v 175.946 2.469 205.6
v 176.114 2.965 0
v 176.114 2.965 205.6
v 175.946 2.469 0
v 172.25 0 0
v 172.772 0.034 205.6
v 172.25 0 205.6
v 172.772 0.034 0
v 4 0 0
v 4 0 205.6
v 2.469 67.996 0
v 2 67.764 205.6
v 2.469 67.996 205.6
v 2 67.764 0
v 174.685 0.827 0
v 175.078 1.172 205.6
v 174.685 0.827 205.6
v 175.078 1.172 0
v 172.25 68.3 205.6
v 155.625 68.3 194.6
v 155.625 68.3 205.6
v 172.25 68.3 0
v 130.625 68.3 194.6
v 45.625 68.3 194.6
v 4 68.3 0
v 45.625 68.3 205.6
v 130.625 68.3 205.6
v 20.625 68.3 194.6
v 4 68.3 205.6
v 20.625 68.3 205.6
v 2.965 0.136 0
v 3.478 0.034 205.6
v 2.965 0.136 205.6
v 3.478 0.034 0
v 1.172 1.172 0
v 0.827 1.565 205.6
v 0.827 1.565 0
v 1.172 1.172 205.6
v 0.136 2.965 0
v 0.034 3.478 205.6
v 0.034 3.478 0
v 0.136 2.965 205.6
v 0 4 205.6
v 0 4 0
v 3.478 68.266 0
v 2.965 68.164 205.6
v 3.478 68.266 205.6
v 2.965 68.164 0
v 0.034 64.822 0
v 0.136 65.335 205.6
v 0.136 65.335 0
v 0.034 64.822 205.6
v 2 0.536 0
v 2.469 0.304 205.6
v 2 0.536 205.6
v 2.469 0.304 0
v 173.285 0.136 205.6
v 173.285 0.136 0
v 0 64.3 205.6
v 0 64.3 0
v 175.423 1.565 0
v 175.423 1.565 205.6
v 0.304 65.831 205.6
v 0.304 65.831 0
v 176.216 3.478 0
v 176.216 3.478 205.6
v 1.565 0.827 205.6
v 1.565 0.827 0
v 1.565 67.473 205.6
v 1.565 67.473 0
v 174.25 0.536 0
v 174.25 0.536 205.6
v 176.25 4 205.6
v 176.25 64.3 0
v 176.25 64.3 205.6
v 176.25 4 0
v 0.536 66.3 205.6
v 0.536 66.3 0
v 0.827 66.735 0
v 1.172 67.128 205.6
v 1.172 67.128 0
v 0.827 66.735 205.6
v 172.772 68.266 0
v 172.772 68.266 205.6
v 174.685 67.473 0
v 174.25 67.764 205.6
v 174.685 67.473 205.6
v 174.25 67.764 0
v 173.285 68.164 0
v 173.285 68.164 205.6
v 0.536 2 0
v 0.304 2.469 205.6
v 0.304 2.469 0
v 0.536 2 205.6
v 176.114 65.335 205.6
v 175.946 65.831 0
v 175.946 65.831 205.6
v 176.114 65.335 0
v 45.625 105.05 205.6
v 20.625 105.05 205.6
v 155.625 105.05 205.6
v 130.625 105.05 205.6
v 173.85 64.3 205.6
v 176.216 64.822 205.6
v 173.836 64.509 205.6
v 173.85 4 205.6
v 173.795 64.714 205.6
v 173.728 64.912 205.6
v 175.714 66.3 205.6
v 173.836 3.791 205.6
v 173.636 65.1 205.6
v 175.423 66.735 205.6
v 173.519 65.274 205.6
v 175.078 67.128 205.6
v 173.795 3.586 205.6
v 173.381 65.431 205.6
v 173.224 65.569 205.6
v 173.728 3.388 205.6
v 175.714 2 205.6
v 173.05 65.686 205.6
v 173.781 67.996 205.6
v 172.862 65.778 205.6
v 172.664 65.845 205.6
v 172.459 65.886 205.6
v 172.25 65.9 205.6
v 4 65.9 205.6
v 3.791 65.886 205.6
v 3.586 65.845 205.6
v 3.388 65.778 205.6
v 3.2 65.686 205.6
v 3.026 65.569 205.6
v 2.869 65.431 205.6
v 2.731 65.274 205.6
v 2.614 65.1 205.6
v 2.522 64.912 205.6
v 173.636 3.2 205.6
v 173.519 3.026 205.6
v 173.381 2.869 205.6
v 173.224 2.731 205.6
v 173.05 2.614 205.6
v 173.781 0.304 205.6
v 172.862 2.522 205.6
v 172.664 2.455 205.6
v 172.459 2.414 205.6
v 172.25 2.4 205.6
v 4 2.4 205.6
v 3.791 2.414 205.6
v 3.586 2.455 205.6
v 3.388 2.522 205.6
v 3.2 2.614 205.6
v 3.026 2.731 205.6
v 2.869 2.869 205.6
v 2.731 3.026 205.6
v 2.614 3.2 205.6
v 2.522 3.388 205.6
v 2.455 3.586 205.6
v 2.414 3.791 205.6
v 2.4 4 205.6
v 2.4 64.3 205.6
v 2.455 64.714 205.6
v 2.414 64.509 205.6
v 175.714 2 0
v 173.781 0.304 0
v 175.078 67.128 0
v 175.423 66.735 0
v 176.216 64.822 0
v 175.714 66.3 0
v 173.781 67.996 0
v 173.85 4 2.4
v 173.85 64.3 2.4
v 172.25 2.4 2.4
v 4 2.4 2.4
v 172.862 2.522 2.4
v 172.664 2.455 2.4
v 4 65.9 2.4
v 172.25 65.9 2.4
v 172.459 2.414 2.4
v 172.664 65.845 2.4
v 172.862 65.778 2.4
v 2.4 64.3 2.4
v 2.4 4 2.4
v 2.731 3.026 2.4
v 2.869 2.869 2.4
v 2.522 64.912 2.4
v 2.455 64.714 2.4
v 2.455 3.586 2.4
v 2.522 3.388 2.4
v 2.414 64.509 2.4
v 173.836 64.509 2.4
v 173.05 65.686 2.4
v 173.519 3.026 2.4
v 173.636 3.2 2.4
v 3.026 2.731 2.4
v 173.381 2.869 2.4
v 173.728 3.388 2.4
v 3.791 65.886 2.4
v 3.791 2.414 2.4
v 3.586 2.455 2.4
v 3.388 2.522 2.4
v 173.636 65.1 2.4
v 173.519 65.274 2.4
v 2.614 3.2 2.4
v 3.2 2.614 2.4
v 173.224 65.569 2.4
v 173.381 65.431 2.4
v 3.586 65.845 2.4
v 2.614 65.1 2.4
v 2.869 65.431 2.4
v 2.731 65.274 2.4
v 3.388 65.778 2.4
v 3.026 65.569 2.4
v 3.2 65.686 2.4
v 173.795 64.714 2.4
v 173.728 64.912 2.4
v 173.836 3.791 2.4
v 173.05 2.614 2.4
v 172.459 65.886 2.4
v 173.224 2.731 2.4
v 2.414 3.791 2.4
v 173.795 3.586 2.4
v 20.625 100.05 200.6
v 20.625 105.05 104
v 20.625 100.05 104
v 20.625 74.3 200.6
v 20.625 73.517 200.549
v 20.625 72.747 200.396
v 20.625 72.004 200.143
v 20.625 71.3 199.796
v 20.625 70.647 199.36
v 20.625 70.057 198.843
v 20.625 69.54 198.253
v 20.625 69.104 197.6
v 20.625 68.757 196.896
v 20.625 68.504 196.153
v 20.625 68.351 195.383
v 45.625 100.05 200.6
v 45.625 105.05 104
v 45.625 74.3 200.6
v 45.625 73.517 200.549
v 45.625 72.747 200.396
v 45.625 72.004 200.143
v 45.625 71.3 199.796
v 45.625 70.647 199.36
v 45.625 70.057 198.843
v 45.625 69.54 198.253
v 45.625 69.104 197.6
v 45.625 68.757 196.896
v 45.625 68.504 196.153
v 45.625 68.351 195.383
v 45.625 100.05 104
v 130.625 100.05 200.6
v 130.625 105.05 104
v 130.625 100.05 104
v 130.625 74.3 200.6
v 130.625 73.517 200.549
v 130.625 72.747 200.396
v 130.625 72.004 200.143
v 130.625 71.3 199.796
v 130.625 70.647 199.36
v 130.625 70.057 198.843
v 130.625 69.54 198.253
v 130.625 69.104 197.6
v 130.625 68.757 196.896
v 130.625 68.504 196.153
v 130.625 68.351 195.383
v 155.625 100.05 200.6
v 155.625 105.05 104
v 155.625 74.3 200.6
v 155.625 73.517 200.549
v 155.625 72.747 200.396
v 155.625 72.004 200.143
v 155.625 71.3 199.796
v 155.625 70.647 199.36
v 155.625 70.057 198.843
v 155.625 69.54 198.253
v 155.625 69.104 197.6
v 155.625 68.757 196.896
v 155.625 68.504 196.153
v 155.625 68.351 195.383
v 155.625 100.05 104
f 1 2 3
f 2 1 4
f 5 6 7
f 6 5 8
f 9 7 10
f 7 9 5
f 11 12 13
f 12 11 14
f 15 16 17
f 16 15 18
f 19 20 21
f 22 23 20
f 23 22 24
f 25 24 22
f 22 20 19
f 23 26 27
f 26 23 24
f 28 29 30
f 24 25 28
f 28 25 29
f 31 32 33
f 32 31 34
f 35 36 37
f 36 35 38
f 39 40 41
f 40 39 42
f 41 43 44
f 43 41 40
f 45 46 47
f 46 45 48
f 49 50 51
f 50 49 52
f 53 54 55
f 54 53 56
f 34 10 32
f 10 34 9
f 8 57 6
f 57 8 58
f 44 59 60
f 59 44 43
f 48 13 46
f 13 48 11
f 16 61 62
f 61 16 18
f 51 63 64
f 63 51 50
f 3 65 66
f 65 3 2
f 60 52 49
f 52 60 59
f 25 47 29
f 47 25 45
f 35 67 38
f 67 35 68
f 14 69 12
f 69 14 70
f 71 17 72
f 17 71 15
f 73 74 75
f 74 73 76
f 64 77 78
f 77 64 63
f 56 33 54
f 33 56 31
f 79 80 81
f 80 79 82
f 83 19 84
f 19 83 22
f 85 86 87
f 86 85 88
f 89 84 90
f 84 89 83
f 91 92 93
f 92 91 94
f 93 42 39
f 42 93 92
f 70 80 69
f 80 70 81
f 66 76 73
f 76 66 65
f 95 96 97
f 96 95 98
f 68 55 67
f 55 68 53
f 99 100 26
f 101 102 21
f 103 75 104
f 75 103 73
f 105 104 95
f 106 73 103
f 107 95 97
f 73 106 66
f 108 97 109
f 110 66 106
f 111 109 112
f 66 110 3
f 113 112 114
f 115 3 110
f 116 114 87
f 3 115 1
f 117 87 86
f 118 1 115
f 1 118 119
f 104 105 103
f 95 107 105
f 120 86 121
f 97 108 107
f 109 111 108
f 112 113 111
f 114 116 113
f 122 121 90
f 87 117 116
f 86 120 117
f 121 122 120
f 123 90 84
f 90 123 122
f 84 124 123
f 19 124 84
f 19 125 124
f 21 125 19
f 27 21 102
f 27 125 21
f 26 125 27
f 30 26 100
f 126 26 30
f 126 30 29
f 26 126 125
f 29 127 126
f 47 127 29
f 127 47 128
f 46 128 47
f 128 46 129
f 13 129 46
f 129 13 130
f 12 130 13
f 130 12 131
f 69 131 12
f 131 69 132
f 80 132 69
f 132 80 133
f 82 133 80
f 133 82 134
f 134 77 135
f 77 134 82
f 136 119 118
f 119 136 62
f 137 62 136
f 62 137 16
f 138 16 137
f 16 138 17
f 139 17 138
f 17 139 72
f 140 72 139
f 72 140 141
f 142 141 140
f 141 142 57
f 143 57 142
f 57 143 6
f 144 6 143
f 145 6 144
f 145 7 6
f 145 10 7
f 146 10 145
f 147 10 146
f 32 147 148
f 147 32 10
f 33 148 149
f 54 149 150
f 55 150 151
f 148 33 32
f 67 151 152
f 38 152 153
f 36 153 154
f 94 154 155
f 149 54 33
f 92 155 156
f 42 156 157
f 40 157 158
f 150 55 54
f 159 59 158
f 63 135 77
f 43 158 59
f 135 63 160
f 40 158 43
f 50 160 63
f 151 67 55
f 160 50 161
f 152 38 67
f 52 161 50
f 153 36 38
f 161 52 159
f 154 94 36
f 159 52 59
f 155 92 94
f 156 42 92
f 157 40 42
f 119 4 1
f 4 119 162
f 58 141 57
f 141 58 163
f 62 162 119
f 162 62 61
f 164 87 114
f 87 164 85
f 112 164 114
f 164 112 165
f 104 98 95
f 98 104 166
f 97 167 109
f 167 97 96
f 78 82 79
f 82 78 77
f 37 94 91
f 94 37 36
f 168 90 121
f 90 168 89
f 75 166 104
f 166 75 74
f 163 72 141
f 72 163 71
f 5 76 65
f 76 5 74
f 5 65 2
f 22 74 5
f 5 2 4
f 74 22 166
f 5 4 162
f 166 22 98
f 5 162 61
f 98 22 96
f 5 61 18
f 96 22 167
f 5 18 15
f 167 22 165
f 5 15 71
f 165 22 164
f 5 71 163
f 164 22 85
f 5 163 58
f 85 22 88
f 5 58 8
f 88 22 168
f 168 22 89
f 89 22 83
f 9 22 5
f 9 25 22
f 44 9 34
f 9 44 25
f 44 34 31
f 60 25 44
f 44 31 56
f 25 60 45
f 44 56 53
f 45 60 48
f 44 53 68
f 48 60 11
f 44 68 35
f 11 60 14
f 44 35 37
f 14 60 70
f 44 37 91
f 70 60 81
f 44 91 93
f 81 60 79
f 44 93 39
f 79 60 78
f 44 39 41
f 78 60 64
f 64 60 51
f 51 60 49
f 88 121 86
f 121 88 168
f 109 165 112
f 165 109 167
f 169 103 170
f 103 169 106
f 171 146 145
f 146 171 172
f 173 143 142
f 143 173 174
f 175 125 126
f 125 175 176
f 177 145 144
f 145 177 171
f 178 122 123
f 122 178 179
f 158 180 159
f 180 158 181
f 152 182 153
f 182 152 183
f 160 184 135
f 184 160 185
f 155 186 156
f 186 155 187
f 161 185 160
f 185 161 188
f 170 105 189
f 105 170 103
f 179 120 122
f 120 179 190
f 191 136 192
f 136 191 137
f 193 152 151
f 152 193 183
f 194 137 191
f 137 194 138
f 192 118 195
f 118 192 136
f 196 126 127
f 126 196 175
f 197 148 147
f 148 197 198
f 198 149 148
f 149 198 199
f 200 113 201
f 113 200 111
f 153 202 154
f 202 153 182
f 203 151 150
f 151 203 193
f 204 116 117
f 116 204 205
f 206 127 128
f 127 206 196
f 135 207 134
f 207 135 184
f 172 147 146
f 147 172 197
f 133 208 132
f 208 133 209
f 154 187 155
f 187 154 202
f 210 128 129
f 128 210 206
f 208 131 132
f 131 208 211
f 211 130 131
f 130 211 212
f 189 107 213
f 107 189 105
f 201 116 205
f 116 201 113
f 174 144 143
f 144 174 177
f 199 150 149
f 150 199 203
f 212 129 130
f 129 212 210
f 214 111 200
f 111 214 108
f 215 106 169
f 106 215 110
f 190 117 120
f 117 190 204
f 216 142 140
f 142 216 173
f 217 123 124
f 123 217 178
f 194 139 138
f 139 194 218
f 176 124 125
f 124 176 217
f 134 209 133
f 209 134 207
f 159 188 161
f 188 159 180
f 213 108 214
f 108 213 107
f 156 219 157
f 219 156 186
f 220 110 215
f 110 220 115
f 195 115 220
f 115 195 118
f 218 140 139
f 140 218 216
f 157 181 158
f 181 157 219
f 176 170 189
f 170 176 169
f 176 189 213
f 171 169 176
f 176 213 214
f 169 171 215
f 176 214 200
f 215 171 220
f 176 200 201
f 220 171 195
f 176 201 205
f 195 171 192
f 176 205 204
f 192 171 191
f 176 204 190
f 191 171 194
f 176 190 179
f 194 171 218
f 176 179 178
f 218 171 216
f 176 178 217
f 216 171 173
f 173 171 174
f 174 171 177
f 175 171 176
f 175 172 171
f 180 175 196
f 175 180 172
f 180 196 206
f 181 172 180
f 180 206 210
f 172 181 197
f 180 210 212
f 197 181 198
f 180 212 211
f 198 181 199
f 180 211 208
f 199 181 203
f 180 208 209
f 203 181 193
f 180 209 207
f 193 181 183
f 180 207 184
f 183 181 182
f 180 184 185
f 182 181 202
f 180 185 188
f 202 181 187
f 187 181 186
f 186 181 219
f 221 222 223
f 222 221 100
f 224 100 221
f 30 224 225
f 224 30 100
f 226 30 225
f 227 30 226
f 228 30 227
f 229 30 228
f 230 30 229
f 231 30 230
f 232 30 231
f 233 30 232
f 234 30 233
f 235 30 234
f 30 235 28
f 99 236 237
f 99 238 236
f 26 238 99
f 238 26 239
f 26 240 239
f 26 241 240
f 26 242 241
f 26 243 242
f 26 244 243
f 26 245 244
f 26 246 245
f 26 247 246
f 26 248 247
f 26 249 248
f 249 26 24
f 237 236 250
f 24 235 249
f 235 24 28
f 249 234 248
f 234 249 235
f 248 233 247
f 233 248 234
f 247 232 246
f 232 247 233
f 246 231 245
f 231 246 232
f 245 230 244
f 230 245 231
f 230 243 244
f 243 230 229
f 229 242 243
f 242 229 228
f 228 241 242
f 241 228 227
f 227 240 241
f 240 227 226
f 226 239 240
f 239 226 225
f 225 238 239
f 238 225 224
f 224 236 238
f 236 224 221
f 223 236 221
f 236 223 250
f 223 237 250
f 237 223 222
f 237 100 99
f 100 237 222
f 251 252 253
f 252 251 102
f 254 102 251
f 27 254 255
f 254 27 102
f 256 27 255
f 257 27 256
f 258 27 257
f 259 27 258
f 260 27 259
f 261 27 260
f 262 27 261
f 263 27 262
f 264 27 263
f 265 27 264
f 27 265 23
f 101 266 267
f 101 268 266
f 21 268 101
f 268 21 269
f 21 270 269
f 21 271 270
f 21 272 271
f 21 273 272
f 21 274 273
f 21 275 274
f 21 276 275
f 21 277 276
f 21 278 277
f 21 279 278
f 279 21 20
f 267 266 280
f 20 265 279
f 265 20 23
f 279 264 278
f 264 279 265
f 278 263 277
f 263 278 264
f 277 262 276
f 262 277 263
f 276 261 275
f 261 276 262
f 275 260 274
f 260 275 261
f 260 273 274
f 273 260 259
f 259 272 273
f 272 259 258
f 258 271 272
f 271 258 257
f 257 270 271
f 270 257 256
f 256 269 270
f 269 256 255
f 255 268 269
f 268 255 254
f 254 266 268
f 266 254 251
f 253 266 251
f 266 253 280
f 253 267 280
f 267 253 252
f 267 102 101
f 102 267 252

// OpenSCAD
// v0.1 sunflower seed holder: open-top pouch for a medium freezer bag,
// hung on a bucket rim by rear hooks. Source: notebook sketch IMG_0148
// (2026-09-29). Sketch dimensions are inches; everything here is mm.
// Print at 100%. See README.md for orientation and what is still unconfirmed.
part="pouch"; // pouch | hook_test
$fn=48;
in=25.4;
// Sketch: 6.75" W x 8" L x 2.5" D. Treated as INSIDE pouch size (unconfirmed).
inner_w=6.75*in;   // 171.45
inner_d=2.5*in;    // 63.5
inner_h=8*in;      // 203.2
wall=2.4;          // 6 perimeters at 0.4 mm nozzle
floor_t=2.4;
corner_r=4;        // outside vertical corners
// Side view: hook throat 1.25" wide, leg 4" long, measured from the top.
hook_gap=1.25*in;  // 31.75, clear gap between pouch back and hook leg
hook_drop=4*in;    // 101.6, top of hook to tip of leg
hook_t=5;          // bar and leg thickness
hook_w=25;         // width of each hook along the pouch
hook_x=[-55,55];   // hook centers from pouch center line
gusset=6;          // fillet block under the top bar where it meets the back wall
test_w=15;         // hook_test coupon thickness
test_wall=40;      // length of back wall kept on the coupon below the leg tip

outer_w=inner_w+2*wall;
outer_d=inner_d+2*wall;
outer_h=inner_h+floor_t;
reach=hook_gap+hook_t;
assert(outer_w+20<=220 && outer_d+reach+20<=220,"Bed footprint exceeded (Ender 3 Neo 220 x 220)");
assert(outer_h<=250,"Taller than Ender 3 Neo Z (250 mm)");
assert(hook_drop<outer_h-floor_t,"Hook leg would pass the pouch floor");
assert(hook_x[1]+hook_w/2<=outer_w/2-corner_r,"Hook runs onto rounded corner");

module rounded_box(w,d,h,r){
 hull() for(x=[r,w-r],y=[r,d-r]) translate([x,y,0]) cylinder(r=r,h=h);
}
// Hook profile in the Y-Z plane; y=0 is the outer back face, z=0 the pouch top.
module hook_profile(){
 translate([-wall/2,-hook_t]) square([reach+wall/2,hook_t]);           // top bar, overlaps wall
 translate([hook_gap,-hook_drop]) square([hook_t,hook_drop]);         // leg
 translate([0,-hook_t]) difference(){                                 // gusset
  translate([-wall/2,-gusset]) square([gusset+wall/2,gusset+1]); // +1 overlaps the bar
  translate([gusset,-gusset]) circle(r=gusset);
 }
}
module hook(){
 rotate([90,0,90]) linear_extrude(hook_w,center=true) hook_profile();
}
module pouch(){
 difference(){
  rounded_box(outer_w,outer_d,outer_h,corner_r);
  translate([wall,wall,floor_t]) rounded_box(inner_w,inner_d,outer_h,max(corner_r-wall,0.5));
 }
 for(x=hook_x) translate([outer_w/2+x,outer_d,outer_h]) hook();
}
// Flat coupon: one hook plus a strip of back wall, printed on its side.
module hook_test(){
 linear_extrude(test_w) {
  translate([0,0]) hook_profile();
  translate([-wall,-(hook_drop+test_wall)]) square([wall,hook_drop+test_wall]);
 }
}
if(part=="pouch") pouch();
else if(part=="hook_test")
 translate([wall,hook_drop+test_wall,0]) hook_test();
else assert(false,str("Unknown part: ",part));
